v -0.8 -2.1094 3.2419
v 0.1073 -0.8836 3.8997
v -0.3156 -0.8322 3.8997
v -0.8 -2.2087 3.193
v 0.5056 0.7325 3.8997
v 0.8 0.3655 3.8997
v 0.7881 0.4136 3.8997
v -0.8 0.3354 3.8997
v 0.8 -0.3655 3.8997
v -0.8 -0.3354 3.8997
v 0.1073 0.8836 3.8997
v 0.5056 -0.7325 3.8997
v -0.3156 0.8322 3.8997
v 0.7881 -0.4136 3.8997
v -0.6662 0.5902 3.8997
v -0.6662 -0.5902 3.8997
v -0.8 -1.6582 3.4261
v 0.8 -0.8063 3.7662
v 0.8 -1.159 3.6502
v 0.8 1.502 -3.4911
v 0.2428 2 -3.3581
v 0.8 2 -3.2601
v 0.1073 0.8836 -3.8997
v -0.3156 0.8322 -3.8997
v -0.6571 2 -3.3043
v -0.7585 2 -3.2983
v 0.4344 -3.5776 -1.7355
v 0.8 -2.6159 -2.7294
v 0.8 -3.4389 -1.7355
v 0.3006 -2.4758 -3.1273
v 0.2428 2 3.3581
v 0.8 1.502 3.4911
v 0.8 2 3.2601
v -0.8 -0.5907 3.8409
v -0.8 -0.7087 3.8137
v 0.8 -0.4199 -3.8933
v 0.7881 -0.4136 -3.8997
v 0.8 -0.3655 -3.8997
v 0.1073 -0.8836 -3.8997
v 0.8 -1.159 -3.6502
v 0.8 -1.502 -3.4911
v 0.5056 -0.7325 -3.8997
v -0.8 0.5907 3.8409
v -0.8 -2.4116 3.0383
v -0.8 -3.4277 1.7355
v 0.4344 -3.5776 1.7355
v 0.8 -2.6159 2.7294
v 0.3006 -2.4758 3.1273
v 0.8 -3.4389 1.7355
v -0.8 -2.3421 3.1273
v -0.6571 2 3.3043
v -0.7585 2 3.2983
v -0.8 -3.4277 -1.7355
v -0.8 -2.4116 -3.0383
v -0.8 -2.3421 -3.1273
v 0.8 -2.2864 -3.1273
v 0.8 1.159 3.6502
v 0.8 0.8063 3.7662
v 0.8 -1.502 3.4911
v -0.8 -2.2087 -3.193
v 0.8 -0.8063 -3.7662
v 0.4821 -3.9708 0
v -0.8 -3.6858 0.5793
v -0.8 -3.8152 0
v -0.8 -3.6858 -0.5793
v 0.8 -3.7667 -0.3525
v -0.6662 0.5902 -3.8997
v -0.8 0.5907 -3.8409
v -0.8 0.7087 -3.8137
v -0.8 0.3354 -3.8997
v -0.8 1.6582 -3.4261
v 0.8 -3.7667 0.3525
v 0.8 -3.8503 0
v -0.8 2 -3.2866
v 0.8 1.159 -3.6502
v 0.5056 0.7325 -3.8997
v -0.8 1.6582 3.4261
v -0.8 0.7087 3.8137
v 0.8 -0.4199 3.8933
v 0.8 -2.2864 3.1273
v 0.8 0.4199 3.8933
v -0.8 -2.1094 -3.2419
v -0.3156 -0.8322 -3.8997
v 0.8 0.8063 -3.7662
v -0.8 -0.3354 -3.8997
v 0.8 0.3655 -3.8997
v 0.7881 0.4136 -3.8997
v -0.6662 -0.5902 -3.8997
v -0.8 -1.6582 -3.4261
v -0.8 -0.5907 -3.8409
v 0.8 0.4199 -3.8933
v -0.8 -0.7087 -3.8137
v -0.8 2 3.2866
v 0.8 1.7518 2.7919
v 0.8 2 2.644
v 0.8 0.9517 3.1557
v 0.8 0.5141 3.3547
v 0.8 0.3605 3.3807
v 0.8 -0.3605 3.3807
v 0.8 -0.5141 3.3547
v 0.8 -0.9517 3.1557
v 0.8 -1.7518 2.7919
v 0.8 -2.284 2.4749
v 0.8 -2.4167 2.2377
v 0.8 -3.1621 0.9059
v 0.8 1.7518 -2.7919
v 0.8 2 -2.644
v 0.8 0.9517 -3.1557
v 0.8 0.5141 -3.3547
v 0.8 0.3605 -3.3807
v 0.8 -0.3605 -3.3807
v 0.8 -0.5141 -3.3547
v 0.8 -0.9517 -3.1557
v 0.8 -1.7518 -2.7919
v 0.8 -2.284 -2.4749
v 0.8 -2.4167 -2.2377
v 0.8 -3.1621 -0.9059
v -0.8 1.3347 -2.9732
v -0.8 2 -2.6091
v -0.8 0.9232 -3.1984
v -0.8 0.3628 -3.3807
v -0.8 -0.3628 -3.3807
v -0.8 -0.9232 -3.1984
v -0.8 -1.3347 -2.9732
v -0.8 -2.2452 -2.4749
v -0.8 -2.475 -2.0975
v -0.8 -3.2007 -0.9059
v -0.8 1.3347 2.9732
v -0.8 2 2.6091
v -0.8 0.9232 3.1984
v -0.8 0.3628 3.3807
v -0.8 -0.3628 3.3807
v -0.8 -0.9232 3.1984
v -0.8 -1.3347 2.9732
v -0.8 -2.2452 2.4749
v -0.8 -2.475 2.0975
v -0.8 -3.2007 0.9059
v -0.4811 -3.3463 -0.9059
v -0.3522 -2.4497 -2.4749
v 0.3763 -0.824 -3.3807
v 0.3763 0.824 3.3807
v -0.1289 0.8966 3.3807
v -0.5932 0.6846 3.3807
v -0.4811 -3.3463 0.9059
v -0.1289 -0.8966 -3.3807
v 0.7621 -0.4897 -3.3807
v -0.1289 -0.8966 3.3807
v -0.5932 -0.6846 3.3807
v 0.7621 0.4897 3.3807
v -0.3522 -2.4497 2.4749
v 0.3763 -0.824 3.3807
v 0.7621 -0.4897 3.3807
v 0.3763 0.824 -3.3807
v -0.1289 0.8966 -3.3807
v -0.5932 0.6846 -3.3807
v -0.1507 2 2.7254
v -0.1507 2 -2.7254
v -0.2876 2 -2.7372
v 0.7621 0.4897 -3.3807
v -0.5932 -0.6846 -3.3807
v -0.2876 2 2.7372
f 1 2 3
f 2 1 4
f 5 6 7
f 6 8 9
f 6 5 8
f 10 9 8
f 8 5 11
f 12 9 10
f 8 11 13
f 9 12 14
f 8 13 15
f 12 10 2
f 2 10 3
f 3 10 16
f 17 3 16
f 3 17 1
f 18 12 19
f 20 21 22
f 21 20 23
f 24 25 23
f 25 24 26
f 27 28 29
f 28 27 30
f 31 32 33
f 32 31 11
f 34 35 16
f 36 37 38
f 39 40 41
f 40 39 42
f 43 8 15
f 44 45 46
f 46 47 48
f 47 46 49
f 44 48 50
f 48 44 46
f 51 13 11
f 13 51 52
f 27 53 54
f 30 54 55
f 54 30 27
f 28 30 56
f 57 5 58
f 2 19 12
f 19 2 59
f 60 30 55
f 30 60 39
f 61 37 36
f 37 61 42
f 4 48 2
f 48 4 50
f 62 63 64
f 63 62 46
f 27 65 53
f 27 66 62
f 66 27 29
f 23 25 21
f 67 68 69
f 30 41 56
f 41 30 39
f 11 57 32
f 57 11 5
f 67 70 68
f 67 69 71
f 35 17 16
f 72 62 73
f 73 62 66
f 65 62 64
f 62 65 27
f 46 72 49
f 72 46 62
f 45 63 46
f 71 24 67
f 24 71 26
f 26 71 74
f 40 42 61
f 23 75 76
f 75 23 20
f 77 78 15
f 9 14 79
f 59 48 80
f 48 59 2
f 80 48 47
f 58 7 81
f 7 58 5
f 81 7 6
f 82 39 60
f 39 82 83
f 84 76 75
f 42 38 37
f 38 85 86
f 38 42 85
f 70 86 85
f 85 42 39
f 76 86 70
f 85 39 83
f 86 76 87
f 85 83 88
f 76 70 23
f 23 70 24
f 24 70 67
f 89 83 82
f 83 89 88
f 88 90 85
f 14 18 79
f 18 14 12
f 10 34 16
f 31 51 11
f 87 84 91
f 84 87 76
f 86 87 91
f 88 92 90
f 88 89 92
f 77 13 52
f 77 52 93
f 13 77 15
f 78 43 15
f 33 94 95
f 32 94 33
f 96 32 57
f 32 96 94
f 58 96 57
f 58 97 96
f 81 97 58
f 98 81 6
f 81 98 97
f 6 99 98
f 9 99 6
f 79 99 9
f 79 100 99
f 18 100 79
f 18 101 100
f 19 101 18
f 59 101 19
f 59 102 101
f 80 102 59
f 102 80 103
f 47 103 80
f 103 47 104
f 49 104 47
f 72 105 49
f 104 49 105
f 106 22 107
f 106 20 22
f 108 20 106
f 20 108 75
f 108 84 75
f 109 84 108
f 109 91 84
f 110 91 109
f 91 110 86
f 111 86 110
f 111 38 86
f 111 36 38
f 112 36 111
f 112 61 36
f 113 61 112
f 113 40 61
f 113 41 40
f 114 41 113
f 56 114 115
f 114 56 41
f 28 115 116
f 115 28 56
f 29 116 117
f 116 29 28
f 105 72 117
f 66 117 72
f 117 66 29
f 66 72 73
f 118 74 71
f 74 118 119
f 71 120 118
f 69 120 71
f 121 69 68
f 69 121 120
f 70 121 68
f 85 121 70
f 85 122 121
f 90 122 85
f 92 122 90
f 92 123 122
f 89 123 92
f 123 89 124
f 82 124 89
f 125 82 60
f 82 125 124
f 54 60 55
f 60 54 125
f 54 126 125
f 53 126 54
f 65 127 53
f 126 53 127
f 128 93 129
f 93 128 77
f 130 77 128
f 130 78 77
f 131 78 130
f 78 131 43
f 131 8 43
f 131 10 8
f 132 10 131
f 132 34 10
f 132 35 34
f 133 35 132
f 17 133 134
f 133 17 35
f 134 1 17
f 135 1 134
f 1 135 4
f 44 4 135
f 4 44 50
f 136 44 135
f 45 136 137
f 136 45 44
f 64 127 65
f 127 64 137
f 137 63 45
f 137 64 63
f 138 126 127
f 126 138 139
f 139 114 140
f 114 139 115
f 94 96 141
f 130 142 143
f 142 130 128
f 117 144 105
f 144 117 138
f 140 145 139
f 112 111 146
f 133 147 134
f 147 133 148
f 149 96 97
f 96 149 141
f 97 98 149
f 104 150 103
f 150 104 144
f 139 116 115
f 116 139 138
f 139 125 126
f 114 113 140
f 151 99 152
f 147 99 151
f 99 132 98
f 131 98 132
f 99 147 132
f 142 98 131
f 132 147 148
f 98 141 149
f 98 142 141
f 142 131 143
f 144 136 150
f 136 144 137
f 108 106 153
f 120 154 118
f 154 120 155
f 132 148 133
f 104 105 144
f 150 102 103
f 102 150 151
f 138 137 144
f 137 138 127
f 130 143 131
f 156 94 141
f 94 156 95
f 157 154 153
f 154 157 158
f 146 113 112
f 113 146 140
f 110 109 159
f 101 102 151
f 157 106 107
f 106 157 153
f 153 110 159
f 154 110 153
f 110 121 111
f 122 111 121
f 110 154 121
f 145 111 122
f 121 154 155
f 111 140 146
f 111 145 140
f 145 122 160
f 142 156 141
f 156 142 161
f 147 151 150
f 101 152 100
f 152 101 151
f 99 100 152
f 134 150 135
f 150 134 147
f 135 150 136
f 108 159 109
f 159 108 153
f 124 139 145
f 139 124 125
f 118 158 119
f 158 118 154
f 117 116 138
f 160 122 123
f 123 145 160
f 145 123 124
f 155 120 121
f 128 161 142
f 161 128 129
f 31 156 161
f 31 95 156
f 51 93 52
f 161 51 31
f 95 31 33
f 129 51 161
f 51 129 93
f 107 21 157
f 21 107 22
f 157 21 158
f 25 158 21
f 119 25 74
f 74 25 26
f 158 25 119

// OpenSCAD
module toarta(raza_toarta)
difference(){
difference(){
difference(){
difference(){
sphere(raza_toarta);
    translate([0.8,-4,-5])
    cube([10,10,10]);
}
translate([-10.8,-4,-5])
    cube([10,10,10]);
}
sphere(raza_toarta-0.5);
}
translate([-2,2,-5])
cube([10,10,10]);
}
toarta(4);
